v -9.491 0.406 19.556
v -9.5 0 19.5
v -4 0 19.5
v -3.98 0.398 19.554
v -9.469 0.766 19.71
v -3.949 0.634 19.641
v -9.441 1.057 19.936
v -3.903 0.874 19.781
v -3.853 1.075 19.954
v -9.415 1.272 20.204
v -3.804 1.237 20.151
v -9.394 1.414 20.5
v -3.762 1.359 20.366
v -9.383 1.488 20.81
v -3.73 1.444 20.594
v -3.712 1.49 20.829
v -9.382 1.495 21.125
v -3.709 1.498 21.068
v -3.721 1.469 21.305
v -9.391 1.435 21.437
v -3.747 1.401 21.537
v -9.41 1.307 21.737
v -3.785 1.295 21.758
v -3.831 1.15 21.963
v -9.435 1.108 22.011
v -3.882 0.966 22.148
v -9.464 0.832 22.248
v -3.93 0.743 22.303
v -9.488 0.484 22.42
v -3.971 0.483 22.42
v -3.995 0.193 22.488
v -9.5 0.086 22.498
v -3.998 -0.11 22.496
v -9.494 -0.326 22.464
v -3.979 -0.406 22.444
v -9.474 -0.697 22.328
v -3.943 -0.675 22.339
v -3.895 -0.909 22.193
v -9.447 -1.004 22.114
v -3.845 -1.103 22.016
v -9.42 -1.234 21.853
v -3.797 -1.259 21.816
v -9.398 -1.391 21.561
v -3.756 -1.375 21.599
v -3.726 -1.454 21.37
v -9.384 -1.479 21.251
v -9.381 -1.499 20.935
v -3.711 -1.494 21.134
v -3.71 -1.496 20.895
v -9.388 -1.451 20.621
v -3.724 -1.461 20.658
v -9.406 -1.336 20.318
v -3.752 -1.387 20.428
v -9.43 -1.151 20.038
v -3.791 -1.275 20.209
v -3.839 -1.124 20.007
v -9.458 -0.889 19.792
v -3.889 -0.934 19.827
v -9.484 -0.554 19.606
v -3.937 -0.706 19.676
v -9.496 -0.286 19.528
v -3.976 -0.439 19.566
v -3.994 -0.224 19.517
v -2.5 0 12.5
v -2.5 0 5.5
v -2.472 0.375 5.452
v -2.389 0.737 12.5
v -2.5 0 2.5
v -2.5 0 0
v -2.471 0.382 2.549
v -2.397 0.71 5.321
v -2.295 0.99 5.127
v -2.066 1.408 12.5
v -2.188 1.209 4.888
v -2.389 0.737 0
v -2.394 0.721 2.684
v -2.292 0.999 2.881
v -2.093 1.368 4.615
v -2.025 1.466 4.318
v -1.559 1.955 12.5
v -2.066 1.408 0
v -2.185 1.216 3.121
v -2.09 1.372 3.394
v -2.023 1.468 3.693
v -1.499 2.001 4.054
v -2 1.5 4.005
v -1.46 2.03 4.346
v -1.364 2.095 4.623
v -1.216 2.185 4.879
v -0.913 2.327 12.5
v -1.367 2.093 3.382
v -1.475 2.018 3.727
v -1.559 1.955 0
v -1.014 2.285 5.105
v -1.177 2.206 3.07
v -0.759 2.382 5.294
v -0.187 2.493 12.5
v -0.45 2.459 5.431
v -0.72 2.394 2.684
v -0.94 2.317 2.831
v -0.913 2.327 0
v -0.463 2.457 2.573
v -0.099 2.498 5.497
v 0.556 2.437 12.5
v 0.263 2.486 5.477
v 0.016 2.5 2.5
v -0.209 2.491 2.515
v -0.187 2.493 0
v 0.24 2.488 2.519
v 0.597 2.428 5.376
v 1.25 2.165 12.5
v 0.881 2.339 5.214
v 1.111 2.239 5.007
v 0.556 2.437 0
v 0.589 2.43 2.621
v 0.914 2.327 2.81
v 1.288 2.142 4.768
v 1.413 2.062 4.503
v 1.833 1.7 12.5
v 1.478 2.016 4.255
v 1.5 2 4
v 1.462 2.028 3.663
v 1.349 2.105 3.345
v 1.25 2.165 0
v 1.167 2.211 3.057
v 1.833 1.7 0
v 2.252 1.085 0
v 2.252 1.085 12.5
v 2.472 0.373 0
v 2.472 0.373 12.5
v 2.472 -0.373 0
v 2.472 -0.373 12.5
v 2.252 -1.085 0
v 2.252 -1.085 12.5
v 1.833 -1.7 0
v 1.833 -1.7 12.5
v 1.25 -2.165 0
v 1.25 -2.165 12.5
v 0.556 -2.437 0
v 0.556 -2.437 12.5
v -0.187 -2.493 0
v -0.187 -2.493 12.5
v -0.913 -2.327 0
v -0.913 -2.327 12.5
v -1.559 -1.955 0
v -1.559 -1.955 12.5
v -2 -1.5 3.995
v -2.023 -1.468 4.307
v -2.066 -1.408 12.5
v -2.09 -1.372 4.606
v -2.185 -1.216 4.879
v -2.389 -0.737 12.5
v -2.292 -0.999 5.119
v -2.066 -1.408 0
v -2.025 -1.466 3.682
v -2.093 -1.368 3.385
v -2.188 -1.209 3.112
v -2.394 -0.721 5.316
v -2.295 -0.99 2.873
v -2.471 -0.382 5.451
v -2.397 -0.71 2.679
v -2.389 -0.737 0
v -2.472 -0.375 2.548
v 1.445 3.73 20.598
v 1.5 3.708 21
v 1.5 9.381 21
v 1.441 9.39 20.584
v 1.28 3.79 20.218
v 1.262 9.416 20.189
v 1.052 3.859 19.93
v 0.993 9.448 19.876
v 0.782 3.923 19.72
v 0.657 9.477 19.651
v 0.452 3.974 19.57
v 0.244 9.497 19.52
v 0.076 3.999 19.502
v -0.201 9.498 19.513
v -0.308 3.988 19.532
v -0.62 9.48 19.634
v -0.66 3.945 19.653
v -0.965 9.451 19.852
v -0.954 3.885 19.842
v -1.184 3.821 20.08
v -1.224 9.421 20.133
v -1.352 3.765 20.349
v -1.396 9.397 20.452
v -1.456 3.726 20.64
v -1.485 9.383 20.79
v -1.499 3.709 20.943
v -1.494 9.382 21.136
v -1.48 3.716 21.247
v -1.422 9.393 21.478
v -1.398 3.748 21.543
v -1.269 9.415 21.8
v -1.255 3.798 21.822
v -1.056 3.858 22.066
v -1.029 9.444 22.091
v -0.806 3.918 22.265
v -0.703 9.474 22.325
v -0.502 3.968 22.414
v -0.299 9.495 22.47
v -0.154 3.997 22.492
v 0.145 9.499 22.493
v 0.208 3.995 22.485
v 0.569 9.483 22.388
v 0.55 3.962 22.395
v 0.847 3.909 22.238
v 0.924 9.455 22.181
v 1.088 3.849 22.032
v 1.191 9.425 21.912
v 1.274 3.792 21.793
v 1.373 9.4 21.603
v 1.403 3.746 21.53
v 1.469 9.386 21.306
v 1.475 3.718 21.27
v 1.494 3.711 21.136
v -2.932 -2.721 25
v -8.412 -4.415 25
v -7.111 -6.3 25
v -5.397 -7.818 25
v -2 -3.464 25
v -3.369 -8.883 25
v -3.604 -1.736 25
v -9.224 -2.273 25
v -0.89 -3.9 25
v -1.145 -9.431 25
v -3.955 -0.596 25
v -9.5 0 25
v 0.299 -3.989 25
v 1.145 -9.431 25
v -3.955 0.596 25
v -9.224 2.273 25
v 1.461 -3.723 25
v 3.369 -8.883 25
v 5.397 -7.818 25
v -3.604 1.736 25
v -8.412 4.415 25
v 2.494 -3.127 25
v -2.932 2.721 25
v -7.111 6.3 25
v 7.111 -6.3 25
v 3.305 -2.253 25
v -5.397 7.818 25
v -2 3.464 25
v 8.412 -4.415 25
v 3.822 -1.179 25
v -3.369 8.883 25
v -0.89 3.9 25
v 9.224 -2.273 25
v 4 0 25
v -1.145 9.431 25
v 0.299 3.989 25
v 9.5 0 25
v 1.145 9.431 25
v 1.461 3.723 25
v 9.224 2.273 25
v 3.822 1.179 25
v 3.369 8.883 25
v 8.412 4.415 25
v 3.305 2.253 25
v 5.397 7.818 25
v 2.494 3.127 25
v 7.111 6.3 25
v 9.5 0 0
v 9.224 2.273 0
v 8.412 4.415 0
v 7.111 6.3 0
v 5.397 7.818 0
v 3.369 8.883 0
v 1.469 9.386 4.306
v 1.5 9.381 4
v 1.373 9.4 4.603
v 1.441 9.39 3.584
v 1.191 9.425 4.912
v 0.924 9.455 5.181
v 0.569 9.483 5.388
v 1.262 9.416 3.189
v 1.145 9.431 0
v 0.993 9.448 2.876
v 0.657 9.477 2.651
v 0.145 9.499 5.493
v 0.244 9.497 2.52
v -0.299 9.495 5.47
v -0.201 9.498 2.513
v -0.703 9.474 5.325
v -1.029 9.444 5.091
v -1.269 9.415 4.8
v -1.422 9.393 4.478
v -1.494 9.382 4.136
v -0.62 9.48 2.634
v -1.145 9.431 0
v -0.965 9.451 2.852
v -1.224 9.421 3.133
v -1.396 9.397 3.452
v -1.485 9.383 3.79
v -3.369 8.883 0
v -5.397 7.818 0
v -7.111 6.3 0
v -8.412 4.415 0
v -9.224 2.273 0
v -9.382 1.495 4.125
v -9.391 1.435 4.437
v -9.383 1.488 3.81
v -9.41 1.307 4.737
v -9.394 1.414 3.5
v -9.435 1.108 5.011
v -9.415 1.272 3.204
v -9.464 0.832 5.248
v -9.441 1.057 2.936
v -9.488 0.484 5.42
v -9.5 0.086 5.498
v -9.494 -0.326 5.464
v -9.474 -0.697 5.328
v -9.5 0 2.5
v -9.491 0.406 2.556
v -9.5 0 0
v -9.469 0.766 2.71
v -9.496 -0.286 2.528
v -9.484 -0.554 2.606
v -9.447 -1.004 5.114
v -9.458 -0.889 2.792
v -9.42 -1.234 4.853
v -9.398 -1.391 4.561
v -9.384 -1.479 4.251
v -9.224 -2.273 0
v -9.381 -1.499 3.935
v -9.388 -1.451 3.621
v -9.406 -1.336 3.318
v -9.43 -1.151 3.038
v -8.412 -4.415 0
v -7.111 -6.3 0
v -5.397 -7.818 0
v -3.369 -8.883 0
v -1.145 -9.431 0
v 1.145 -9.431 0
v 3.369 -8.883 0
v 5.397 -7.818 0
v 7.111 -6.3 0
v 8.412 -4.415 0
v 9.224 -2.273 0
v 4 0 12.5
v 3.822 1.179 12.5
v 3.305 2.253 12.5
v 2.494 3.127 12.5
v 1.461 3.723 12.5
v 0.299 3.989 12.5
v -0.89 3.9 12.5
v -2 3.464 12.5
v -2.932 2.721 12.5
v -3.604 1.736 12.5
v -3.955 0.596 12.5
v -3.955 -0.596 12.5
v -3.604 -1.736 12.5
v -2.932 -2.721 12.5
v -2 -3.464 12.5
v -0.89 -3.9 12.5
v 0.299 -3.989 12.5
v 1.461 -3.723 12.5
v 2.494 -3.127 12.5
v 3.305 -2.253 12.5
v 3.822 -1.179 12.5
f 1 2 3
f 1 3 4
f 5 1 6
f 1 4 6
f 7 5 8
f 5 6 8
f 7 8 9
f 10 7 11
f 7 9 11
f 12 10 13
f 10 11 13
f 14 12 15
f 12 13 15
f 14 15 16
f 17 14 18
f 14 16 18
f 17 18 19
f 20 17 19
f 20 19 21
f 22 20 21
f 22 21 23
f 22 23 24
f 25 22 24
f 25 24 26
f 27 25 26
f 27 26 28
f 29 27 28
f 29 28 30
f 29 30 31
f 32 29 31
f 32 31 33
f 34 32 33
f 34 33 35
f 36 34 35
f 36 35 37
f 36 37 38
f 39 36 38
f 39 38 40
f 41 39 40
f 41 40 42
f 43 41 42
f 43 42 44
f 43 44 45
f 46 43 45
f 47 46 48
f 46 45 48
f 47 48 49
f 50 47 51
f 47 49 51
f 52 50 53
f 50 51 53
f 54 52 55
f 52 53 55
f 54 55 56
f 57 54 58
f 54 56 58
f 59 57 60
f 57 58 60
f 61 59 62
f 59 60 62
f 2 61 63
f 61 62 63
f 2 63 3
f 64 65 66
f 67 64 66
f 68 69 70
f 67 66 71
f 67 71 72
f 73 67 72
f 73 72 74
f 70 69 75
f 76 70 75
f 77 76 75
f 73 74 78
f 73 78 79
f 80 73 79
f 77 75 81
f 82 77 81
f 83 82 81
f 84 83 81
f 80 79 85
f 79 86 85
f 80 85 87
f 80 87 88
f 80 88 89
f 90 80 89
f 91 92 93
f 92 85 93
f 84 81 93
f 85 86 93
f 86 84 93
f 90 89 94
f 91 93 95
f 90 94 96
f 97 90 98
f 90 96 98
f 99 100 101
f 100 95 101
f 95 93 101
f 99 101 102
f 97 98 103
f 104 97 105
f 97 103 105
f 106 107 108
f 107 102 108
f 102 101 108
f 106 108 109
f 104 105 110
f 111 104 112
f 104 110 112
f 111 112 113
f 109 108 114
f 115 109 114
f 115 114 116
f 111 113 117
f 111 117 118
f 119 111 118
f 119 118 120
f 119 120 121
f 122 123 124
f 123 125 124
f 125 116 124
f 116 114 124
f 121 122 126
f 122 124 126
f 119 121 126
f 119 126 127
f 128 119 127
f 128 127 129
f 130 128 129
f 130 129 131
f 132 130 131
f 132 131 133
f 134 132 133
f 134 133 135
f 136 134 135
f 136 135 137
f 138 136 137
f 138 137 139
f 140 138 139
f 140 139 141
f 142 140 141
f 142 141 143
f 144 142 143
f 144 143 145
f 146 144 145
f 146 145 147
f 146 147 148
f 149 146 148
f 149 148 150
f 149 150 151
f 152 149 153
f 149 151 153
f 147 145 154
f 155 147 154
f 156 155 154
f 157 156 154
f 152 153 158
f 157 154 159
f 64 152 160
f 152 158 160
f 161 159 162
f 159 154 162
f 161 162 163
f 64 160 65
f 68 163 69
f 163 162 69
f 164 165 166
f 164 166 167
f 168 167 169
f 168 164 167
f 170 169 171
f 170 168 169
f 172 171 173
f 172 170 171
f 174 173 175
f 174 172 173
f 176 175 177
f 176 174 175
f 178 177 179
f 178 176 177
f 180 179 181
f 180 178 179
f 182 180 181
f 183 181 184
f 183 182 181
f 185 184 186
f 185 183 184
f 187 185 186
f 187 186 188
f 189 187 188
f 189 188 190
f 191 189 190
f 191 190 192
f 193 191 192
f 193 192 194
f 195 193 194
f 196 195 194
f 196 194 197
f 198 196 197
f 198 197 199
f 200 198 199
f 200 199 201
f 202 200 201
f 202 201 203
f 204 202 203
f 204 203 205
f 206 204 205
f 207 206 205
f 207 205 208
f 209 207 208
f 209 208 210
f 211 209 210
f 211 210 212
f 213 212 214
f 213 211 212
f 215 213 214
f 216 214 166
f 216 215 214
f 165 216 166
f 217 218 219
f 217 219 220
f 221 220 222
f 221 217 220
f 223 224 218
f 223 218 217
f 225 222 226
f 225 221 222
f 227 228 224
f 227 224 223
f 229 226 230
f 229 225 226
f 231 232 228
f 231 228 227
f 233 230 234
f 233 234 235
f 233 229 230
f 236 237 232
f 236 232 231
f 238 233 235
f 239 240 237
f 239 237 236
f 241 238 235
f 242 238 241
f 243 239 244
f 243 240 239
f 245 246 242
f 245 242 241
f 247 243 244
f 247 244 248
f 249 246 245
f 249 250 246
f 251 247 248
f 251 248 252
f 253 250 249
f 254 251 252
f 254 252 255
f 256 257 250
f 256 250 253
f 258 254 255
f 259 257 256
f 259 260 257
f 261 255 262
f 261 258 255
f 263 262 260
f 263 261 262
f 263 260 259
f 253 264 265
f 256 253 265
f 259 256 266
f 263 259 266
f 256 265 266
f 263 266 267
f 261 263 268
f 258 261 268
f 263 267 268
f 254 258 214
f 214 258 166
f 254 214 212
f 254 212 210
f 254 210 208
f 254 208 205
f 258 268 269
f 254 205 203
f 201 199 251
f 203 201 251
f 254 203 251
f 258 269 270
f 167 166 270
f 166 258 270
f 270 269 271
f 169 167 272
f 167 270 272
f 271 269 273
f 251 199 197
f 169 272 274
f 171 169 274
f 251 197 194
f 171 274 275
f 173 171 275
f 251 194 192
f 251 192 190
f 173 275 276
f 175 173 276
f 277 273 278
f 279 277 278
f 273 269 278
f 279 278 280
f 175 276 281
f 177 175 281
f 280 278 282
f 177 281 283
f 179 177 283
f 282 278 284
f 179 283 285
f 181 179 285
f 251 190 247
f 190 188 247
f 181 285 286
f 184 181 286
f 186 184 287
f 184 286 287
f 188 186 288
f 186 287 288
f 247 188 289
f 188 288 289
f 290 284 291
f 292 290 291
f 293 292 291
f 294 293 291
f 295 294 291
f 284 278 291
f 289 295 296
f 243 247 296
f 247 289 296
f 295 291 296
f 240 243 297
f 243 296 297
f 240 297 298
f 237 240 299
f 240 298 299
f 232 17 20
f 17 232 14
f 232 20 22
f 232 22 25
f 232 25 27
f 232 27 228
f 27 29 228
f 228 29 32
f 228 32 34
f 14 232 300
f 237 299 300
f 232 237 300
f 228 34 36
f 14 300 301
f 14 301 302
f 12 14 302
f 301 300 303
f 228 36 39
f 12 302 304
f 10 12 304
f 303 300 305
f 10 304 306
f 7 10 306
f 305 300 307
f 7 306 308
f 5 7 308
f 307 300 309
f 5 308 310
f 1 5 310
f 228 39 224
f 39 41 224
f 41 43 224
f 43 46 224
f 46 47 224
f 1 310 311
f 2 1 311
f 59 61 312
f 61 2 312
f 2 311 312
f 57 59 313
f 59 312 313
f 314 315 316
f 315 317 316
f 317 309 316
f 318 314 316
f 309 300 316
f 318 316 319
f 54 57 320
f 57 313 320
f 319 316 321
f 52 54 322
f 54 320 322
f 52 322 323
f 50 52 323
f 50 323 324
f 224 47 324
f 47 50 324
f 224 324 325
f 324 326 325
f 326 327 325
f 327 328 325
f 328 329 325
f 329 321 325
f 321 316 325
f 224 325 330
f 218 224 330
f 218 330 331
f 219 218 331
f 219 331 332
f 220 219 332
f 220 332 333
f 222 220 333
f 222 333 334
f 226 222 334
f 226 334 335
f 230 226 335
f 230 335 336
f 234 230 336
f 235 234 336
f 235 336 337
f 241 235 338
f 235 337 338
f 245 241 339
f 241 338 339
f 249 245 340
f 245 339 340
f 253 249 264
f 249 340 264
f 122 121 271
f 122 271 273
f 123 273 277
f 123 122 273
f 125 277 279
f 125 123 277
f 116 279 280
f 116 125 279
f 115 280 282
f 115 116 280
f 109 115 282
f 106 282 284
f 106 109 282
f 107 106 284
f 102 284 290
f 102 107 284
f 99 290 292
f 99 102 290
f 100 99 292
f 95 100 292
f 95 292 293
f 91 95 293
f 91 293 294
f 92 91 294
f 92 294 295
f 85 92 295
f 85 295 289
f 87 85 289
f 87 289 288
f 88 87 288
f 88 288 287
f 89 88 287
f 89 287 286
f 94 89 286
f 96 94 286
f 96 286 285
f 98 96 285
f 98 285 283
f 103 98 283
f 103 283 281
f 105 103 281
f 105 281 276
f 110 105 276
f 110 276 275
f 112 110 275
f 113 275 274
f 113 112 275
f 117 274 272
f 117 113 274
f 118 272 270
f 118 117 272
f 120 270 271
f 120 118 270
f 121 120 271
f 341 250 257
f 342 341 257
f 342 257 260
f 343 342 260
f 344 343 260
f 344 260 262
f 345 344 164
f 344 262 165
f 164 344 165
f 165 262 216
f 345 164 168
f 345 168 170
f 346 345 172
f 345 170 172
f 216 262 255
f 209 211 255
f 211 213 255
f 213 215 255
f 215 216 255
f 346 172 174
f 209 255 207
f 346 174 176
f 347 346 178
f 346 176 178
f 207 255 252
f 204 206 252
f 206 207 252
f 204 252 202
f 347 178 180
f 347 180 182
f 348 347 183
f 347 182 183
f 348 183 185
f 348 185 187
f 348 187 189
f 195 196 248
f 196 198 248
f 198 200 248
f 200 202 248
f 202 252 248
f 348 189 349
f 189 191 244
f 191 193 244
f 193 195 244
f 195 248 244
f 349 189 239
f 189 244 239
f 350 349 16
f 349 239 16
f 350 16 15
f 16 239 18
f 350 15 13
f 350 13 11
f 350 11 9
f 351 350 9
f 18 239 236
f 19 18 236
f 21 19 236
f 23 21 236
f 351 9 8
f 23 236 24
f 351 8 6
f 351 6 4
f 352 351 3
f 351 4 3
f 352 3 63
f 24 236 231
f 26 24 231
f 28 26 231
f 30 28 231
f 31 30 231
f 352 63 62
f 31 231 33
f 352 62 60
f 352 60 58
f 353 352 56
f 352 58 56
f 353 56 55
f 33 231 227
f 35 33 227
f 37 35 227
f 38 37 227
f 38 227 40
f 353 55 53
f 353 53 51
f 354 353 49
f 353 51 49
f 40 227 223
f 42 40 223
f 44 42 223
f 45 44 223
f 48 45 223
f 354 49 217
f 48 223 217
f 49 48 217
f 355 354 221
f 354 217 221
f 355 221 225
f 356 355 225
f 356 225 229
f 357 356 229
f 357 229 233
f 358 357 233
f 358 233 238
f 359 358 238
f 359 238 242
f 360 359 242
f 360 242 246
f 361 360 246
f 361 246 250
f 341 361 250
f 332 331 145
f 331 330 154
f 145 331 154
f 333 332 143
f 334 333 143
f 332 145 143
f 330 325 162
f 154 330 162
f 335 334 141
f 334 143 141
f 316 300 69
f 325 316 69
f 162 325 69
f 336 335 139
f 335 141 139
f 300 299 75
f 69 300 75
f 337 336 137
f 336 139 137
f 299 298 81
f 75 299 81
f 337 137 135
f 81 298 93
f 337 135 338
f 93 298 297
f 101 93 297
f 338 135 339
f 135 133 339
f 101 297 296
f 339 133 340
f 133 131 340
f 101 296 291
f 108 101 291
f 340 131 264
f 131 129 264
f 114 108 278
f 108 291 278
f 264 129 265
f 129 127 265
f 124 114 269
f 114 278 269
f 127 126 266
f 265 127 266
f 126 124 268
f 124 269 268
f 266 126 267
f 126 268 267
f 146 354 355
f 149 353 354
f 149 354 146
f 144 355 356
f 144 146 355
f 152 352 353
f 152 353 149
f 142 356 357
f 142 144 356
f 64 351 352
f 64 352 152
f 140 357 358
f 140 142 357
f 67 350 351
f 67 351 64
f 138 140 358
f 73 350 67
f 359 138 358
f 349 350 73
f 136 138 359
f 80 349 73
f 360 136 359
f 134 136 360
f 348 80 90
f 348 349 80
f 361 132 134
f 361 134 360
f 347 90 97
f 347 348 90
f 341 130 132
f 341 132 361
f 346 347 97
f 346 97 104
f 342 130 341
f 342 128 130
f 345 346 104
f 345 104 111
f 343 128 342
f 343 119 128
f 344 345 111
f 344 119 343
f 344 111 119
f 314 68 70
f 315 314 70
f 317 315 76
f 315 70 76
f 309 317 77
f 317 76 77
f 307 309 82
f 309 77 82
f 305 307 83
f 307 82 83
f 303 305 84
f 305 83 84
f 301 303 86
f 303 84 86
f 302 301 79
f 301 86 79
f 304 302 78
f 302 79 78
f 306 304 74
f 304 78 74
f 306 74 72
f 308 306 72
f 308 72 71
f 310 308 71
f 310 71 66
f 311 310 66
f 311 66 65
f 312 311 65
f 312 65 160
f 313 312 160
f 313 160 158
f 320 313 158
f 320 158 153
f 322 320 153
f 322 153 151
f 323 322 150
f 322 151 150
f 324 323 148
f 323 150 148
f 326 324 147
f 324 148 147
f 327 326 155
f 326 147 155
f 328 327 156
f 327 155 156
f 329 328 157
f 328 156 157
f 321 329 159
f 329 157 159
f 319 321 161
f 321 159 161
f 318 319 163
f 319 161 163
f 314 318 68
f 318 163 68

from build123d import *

# Parameters (mm, degrees)
ESBO_O1_R                = 9.5
RESSALTO_EXTRUS_O1_DEPTH = 25
ESBO_O2_R                = 4
CORTE_EXTRUS_O1_DEPTH    = 12.5
ESBO_O3_R                = 2.5
CORTE_EXTRUS_O2_DEPTH    = 26
ESBO_O4_R                = 1.5
CORTE_EXTRUS_O3_DEPTH    = 12
ESBO_O5_R                = 1.5
CORTE_EXTRUS_O4_DEPTH    = 10.5000001


with BuildPart() as part:
    # Esboço1 → Ressalto-extrusão1 (new body)
    with BuildSketch(Plane.XY):
        Circle(ESBO_O1_R)
    extrude(amount=RESSALTO_EXTRUS_O1_DEPTH)

    # Esboço2 → Corte-extrusão1 (cut)
    with BuildSketch(Plane.XY.offset(25)):
        Circle(ESBO_O2_R)
    extrude(amount=-CORTE_EXTRUS_O1_DEPTH, mode=Mode.SUBTRACT)

    # Esboço3 → Corte-extrusão2 (cut, through all)
    with BuildSketch(Plane(origin=(0, 0, 0), x_dir=(-1, 0, 0), z_dir=(0, 0, -1))):
        Circle(ESBO_O3_R)
    extrude(amount=-CORTE_EXTRUS_O2_DEPTH, mode=Mode.SUBTRACT)

    # Esboço4 → Corte-extrusão3 (cut)
    with BuildSketch(Plane(origin=(0, 0, 0), x_dir=(1, 0, 0), z_dir=(0, 1, 0))):
        with Locations((0, -4)):
            Circle(ESBO_O4_R)
        with Locations((0, -21)):
            Circle(ESBO_O4_R)
    extrude(amount=CORTE_EXTRUS_O3_DEPTH, mode=Mode.SUBTRACT)

    # Esboço5 → Corte-extrusão4 (cut, through all)
    with BuildSketch(Plane(origin=(0, 0, 0), x_dir=(0, 0, -1), z_dir=(1, 0, 0))):
        with Locations((-21, 0)):
            Circle(ESBO_O5_R)
        with Locations((-4, 0)):
            Circle(ESBO_O5_R)
    extrude(amount=-CORTE_EXTRUS_O4_DEPTH, mode=Mode.SUBTRACT)


solid = part.part
